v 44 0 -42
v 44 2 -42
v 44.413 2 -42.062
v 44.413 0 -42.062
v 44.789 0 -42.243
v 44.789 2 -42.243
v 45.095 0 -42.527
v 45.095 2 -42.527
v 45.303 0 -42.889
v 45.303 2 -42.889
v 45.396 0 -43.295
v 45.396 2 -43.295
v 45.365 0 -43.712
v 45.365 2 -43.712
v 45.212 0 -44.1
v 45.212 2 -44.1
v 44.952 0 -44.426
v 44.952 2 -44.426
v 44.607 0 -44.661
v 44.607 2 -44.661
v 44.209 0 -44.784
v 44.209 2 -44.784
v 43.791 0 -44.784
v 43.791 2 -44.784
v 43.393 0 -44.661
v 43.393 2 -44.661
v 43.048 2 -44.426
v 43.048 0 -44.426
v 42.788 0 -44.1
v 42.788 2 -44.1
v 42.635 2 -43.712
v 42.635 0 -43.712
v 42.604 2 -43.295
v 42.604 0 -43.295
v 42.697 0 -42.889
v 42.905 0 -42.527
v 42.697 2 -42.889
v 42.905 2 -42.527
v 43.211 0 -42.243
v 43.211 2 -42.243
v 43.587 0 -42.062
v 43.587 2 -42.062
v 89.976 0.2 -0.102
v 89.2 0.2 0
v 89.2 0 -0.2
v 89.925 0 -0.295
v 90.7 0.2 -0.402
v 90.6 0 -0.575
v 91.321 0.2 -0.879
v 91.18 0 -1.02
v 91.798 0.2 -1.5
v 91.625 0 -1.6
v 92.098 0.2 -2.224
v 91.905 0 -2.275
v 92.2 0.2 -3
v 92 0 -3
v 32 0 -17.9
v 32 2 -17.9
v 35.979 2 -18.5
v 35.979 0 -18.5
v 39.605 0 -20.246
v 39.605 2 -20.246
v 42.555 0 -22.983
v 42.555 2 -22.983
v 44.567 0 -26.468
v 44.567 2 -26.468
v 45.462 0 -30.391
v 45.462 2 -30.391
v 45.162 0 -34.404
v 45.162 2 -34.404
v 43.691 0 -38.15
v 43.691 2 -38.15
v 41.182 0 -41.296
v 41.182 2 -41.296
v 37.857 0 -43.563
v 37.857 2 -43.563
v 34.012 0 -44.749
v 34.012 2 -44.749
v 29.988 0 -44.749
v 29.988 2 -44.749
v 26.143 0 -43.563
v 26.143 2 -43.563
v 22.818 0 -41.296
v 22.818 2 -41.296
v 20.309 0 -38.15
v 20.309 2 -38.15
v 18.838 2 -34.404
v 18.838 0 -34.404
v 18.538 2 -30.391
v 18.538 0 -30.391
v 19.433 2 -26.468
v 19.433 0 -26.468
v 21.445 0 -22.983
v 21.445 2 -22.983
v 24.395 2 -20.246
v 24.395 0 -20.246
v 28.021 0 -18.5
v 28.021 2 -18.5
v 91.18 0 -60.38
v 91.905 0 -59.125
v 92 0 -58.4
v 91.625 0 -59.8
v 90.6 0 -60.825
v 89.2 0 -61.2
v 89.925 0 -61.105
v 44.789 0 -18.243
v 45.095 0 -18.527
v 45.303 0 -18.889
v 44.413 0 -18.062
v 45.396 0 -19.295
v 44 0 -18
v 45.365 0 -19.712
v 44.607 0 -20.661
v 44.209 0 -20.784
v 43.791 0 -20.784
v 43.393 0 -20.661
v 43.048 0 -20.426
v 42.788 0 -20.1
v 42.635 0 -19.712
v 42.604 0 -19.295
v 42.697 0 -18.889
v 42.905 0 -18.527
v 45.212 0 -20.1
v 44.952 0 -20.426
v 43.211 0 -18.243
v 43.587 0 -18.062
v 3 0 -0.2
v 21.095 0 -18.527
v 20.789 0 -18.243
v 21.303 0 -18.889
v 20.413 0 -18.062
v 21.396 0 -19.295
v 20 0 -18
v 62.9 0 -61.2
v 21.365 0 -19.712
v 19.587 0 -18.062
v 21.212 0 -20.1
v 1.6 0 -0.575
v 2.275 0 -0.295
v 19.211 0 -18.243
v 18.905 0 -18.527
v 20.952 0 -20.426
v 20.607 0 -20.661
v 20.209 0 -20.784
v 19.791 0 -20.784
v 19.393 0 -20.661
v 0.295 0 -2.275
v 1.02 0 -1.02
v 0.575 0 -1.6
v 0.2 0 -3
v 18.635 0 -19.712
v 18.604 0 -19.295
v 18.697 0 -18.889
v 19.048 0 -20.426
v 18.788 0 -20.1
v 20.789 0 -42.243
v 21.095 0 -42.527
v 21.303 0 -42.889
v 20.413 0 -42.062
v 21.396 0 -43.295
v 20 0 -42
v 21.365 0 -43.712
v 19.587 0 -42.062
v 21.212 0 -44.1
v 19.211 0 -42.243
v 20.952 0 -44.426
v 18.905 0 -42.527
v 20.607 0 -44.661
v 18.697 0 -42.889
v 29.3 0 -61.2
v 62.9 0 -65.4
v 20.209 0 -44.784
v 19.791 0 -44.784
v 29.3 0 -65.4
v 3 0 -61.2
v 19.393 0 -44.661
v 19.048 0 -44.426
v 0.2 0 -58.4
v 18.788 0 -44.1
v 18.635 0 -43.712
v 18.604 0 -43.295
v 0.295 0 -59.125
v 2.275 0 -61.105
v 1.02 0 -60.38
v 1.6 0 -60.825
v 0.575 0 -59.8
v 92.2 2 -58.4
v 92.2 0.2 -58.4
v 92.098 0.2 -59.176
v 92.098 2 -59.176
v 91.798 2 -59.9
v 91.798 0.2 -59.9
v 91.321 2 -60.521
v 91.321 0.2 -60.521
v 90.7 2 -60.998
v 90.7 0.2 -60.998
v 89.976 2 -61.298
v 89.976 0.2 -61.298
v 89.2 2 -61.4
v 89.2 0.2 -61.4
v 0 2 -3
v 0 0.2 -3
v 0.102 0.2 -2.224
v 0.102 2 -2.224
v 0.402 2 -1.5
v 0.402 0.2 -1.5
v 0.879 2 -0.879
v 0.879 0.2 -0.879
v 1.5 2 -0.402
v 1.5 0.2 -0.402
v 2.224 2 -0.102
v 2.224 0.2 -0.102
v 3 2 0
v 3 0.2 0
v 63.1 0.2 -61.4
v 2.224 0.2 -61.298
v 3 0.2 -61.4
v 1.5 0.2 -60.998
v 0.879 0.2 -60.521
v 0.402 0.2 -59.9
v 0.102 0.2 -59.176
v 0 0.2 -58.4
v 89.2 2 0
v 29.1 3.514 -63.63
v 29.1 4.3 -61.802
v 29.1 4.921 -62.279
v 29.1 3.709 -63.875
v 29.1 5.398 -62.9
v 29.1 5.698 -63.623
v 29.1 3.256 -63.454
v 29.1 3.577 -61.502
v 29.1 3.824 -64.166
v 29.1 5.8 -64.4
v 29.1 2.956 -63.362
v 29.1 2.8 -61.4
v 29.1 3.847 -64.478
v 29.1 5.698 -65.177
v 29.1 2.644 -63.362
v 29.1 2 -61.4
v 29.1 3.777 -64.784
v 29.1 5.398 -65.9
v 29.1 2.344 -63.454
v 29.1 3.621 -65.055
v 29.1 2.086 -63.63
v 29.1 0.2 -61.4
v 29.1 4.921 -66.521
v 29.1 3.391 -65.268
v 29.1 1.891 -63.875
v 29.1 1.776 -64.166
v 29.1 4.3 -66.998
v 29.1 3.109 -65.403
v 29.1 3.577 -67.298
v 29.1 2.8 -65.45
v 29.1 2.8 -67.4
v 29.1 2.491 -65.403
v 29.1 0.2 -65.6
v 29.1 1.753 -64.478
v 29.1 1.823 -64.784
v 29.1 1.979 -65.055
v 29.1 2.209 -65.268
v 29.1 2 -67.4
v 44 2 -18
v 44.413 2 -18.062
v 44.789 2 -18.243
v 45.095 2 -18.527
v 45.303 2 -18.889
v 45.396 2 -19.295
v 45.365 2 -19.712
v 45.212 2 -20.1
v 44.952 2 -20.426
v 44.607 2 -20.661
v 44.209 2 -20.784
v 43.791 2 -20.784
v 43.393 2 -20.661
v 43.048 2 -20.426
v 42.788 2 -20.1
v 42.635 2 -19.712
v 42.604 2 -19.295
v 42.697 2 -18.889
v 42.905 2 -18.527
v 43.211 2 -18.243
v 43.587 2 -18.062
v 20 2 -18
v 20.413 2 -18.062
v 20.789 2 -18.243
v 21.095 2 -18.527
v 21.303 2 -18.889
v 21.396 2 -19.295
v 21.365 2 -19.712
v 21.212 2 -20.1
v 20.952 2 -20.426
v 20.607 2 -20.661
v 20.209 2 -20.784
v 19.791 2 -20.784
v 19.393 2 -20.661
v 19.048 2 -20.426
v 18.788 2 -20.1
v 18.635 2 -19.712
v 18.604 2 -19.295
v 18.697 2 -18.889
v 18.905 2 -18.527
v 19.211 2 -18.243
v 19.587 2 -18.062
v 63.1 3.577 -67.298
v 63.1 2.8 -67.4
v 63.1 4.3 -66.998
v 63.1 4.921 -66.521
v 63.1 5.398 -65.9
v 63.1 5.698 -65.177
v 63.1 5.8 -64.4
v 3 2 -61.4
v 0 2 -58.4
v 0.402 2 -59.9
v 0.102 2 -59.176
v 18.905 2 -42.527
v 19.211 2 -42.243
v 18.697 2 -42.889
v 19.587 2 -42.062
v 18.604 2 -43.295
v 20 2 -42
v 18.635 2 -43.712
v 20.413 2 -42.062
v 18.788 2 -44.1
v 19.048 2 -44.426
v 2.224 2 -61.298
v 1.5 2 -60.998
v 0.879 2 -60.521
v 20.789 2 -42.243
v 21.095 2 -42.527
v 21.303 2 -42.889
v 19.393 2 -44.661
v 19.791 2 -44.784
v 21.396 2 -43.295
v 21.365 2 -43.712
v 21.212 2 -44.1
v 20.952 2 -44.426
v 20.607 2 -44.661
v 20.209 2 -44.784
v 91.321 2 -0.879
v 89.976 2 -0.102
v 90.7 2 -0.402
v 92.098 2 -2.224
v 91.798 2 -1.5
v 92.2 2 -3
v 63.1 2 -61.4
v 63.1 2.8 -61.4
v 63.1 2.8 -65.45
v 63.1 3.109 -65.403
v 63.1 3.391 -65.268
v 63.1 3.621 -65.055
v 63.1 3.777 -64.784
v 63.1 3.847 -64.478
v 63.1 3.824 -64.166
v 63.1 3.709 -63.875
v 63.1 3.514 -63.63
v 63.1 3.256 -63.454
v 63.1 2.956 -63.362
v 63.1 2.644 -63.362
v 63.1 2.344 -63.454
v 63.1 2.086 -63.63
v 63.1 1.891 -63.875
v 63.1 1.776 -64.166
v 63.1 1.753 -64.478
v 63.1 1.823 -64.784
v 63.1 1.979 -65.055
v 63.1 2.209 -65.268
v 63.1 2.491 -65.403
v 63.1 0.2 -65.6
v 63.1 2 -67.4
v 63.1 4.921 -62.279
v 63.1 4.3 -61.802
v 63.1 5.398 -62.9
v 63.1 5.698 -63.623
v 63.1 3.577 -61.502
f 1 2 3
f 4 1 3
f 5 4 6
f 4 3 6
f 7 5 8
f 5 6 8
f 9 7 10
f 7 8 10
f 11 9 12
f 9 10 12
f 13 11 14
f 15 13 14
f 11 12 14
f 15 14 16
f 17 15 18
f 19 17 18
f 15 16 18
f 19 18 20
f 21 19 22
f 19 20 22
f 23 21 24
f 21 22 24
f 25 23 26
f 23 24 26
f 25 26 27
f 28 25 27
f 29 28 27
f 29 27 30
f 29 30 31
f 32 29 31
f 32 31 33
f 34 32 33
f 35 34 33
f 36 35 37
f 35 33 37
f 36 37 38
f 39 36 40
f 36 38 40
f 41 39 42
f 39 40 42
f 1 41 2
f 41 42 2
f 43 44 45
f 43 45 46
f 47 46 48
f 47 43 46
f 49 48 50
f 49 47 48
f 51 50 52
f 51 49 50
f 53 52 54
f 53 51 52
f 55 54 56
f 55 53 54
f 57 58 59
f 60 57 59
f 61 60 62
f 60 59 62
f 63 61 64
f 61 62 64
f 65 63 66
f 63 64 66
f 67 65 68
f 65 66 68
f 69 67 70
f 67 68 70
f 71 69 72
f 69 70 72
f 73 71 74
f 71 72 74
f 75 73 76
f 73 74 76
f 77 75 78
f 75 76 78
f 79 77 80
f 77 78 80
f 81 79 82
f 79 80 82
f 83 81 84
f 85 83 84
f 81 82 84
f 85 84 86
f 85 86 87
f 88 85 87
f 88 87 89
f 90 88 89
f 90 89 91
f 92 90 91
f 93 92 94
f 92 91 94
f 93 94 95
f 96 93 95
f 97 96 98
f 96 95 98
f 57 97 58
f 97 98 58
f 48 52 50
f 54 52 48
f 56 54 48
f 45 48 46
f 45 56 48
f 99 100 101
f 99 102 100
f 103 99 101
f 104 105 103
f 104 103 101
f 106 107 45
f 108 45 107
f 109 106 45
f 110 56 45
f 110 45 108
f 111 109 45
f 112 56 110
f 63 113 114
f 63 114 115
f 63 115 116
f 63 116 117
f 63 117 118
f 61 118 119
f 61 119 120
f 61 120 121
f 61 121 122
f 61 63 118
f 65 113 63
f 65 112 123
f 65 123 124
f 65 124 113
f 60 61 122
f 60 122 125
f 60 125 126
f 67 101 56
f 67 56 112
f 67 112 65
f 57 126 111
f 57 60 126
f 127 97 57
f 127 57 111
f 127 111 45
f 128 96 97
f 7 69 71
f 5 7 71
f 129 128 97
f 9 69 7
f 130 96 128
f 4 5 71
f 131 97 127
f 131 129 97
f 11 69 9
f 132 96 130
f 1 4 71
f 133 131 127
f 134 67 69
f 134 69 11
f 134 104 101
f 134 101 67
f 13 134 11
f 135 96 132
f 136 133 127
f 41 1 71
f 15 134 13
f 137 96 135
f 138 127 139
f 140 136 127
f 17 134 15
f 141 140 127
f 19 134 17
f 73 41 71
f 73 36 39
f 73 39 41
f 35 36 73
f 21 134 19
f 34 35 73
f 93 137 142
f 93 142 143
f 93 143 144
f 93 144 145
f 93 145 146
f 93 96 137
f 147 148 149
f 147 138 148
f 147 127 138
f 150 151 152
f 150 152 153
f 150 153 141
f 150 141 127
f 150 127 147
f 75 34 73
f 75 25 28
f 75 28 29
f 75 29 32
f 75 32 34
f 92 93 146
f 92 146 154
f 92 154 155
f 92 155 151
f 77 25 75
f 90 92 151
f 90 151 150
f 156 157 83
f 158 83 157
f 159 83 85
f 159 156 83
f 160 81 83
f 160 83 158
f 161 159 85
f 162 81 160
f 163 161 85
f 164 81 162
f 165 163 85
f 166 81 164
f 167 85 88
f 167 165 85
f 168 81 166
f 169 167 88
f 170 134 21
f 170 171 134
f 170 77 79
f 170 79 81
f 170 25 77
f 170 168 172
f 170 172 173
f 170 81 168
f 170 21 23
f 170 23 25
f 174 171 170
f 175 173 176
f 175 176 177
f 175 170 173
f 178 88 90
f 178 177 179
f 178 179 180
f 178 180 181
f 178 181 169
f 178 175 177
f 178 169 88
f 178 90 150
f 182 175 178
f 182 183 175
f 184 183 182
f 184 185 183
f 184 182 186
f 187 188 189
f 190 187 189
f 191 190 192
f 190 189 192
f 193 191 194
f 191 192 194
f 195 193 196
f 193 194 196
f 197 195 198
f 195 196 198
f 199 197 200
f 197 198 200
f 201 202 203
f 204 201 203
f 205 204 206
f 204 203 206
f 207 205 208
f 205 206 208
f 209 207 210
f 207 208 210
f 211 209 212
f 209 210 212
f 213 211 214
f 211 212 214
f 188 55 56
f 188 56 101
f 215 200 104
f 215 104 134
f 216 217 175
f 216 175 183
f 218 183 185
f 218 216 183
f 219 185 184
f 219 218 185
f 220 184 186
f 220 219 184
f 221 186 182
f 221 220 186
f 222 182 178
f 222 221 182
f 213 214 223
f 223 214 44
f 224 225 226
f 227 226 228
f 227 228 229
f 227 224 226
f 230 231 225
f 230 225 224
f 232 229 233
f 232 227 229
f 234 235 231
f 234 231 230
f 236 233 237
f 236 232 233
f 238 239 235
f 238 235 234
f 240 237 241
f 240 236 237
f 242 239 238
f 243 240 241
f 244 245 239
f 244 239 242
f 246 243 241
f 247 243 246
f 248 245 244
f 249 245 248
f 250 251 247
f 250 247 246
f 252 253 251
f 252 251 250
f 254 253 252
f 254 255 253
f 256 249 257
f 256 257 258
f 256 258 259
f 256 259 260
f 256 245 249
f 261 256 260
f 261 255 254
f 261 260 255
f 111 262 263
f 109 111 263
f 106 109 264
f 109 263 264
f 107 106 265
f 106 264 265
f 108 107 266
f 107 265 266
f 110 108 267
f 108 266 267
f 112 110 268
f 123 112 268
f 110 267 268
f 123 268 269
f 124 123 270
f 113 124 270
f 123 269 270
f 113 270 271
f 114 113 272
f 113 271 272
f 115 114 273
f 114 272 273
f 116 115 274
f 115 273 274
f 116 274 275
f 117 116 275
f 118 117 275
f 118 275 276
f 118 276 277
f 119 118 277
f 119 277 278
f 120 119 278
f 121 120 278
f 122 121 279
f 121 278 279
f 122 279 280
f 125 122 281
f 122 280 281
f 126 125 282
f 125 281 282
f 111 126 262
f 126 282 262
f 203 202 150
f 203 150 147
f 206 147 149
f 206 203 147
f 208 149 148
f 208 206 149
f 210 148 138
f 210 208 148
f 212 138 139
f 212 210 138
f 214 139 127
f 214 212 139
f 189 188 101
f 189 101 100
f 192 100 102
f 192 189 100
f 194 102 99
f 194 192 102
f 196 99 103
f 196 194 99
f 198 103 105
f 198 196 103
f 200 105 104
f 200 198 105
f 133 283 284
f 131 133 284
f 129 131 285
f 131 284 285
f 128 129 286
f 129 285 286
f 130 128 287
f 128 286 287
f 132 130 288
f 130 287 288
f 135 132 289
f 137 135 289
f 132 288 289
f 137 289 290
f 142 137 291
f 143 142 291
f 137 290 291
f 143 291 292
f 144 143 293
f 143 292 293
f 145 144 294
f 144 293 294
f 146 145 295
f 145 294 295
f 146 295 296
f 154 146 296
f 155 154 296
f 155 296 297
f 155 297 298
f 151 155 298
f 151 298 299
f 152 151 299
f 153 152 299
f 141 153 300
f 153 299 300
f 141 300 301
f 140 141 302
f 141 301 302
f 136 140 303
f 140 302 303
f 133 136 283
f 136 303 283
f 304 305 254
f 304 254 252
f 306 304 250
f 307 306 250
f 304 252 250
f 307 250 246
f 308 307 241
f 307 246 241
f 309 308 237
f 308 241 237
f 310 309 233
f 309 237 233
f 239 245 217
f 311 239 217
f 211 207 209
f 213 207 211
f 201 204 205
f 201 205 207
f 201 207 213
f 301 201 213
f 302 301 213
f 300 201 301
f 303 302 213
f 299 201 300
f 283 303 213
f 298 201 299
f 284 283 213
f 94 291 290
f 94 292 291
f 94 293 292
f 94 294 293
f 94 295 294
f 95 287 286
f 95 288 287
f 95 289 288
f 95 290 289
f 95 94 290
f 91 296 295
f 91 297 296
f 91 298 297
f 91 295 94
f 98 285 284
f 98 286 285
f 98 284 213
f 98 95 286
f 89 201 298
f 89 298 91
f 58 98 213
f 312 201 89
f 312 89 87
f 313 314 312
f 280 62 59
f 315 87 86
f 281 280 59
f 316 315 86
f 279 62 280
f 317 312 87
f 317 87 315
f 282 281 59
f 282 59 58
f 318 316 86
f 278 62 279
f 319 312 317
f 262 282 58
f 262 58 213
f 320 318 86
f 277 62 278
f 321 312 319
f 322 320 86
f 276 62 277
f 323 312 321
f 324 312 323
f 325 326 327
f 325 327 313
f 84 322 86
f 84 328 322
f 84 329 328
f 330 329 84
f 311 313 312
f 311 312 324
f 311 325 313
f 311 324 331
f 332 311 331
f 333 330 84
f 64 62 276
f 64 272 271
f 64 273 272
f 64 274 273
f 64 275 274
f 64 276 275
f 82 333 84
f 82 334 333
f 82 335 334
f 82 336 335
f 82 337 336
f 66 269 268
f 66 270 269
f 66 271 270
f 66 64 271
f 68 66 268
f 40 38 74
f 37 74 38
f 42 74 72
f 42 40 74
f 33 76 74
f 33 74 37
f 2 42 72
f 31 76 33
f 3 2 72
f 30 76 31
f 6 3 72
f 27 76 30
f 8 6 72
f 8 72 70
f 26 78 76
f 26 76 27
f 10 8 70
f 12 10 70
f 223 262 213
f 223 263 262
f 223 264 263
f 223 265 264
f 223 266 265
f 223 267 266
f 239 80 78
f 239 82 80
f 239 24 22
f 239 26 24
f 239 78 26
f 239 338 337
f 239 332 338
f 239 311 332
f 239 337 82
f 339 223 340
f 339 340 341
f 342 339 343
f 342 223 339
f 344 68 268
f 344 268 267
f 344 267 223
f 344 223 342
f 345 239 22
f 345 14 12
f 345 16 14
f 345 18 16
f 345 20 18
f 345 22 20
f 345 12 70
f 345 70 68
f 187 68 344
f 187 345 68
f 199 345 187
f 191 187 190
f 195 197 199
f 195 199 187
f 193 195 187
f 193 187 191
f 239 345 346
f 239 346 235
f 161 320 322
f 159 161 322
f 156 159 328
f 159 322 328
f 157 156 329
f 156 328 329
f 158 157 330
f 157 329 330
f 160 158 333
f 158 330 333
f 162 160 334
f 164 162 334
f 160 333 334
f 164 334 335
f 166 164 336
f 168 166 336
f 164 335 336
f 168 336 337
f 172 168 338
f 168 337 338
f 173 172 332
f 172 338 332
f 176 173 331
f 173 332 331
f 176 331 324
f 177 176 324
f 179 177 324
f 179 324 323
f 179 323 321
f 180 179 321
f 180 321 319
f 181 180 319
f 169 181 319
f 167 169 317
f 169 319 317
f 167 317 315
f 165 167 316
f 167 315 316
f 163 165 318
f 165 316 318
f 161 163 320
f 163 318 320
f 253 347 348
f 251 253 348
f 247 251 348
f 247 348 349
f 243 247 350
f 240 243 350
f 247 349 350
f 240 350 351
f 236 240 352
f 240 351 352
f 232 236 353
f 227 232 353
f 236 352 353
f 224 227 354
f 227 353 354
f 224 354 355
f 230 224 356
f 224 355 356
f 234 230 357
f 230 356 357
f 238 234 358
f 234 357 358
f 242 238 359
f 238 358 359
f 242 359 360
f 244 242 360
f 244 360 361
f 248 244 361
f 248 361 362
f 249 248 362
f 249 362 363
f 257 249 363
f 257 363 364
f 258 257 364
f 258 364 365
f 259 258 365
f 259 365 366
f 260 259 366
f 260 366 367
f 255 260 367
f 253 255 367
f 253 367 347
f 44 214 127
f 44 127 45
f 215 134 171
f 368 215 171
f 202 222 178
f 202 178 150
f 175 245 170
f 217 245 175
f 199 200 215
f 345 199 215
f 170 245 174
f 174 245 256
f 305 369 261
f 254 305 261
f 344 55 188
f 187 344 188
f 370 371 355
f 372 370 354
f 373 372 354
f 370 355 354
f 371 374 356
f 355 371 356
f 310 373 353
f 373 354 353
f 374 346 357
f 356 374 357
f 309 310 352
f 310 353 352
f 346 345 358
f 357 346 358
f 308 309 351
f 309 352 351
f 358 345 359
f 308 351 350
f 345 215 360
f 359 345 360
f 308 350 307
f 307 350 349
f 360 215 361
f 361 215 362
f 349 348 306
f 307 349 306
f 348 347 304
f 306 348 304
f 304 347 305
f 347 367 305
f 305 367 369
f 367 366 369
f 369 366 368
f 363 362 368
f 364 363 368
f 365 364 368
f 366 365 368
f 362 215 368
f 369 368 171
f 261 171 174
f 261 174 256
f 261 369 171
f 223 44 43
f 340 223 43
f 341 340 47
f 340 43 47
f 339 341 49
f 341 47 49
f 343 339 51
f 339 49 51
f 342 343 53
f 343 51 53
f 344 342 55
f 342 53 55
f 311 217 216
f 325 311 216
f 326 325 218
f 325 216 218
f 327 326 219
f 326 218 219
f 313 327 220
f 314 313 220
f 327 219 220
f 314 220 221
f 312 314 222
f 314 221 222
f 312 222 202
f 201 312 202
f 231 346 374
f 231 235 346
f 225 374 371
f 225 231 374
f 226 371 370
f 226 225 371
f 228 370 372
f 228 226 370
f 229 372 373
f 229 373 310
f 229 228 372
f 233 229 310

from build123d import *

# Parameters (mm, degrees)
EXTRUDE_1_DEPTH     = 2
SKETCH_2_W          = 34
SKETCH_2_H          = 6
EXTRUDE_2_DEPTH     = 5.8
SKETCH_3_R          = 1.05
CUT_EXTRUDE_1_DEPTH = 93.509513024
FILLET_1_R          = 3
CHAMFER_1_SIZE      = 2
SKETCH_4_R          = 1.4
SKETCH_4_R_2        = 13.5
CUT_EXTRUDE_2_DEPTH = 2
CHAMFER_2_SIZE      = 0.2


with BuildPart() as part:
    # 草图1 → 凸台-拉伸1 (new body)
    with BuildSketch(Plane(origin=(0, 0, 0), x_dir=(1, 0, 0), z_dir=(0, 1, 0))):
        with BuildLine():
            Line((3, 0), (89.2, 0))
            ThreePointArc((89.2, 0), (91.321320344, 0.878679656), (92.2, 3))
            Line((92.2, 3), (92.2, 58.4))
            ThreePointArc((92.2, 58.4), (91.321320344, 60.521320344), (89.2, 61.4))
            Line((89.2, 61.4), (3, 61.4))
            ThreePointArc((3, 61.4), (0.878679656, 60.521320344), (0, 58.4))
            Line((0, 58.4), (0, 3))
            ThreePointArc((0, 3), (0.878679656, 0.878679656), (3, 0))
        make_face()
    extrude(amount=EXTRUDE_1_DEPTH)

    # 草图2 → 凸台-拉伸2 (add)
    with BuildSketch(Plane(origin=(0, 0, 0), x_dir=(-1, 0, 0), z_dir=(0, -1, 0))):
        with Locations((-46.1, 64.4)):
            Rectangle(SKETCH_2_W, SKETCH_2_H)
    extrude(amount=-EXTRUDE_2_DEPTH)

    # 草图3 → 切除-拉伸1 (cut, through all)
    with BuildSketch(Plane(origin=(63.1, 0, 0), x_dir=(0, 0, -1), z_dir=(1, 0, 0))):
        with Locations((64.4, 2.8)):
            Circle(SKETCH_3_R)
    extrude(amount=-CUT_EXTRUDE_1_DEPTH, mode=Mode.SUBTRACT)

    # 圆角1
    fillet_1_edges = [part.edges().sort_by_distance(p)[0] for p in [
        (46.1, 5.8, -67.4),
        (46.1, 5.8, -61.4),
    ]]
    fillet(fillet_1_edges, radius=FILLET_1_R - 0.0001)  # a hair under: the kernel refuses the full size

    # 倒角1
    chamfer_1_edges = [part.edges().sort_by_distance(p)[0] for p in [
        (46.1, 0, -67.4),
    ]]
    chamfer(chamfer_1_edges, length=CHAMFER_1_SIZE)

    # 草图4 → 切除-拉伸2 (cut)
    with BuildSketch(Plane(origin=(0, 2, 0), x_dir=(1, 0, 0), z_dir=(0, 1, 0))):
        with Locations(Location((20, 43.4, 0), (0, 0, 270))):
            Circle(SKETCH_4_R)
        with Locations(Location((44, 43.4, 0), (0, 0, 270))):
            Circle(SKETCH_4_R)
        with Locations(Location((44, 19.4, 0), (0, 0, 270))):
            Circle(SKETCH_4_R)
        with Locations(Location((20, 19.4, 0), (0, 0, 270))):
            Circle(SKETCH_4_R)
        with Locations(Location((32, 31.4, 0), (0, 0, 270))):
            Circle(SKETCH_4_R_2)
    extrude(amount=-CUT_EXTRUDE_2_DEPTH, mode=Mode.SUBTRACT)

    # 倒角2
    chamfer_2_edges = [part.edges().sort_by_distance(p)[0] for p in [
        (0, 0, -30.7),
        (0.878679656, 0, -60.521320344),
        (76.15, 0, -61.4),
        (91.321320344, 0, -60.521320344),
        (16.05, 0, -61.4),
        (29.1, 0, -63.4),
        (63.1, 0, -63.4),
        (92.2, 0, -30.7),
        (91.321320344, 0, -0.878679656),
        (46.1, 0, 0),
        (0.878679656, 0, -0.878679656),
    ]]
    chamfer(chamfer_2_edges, length=CHAMFER_2_SIZE)


solid = part.part
